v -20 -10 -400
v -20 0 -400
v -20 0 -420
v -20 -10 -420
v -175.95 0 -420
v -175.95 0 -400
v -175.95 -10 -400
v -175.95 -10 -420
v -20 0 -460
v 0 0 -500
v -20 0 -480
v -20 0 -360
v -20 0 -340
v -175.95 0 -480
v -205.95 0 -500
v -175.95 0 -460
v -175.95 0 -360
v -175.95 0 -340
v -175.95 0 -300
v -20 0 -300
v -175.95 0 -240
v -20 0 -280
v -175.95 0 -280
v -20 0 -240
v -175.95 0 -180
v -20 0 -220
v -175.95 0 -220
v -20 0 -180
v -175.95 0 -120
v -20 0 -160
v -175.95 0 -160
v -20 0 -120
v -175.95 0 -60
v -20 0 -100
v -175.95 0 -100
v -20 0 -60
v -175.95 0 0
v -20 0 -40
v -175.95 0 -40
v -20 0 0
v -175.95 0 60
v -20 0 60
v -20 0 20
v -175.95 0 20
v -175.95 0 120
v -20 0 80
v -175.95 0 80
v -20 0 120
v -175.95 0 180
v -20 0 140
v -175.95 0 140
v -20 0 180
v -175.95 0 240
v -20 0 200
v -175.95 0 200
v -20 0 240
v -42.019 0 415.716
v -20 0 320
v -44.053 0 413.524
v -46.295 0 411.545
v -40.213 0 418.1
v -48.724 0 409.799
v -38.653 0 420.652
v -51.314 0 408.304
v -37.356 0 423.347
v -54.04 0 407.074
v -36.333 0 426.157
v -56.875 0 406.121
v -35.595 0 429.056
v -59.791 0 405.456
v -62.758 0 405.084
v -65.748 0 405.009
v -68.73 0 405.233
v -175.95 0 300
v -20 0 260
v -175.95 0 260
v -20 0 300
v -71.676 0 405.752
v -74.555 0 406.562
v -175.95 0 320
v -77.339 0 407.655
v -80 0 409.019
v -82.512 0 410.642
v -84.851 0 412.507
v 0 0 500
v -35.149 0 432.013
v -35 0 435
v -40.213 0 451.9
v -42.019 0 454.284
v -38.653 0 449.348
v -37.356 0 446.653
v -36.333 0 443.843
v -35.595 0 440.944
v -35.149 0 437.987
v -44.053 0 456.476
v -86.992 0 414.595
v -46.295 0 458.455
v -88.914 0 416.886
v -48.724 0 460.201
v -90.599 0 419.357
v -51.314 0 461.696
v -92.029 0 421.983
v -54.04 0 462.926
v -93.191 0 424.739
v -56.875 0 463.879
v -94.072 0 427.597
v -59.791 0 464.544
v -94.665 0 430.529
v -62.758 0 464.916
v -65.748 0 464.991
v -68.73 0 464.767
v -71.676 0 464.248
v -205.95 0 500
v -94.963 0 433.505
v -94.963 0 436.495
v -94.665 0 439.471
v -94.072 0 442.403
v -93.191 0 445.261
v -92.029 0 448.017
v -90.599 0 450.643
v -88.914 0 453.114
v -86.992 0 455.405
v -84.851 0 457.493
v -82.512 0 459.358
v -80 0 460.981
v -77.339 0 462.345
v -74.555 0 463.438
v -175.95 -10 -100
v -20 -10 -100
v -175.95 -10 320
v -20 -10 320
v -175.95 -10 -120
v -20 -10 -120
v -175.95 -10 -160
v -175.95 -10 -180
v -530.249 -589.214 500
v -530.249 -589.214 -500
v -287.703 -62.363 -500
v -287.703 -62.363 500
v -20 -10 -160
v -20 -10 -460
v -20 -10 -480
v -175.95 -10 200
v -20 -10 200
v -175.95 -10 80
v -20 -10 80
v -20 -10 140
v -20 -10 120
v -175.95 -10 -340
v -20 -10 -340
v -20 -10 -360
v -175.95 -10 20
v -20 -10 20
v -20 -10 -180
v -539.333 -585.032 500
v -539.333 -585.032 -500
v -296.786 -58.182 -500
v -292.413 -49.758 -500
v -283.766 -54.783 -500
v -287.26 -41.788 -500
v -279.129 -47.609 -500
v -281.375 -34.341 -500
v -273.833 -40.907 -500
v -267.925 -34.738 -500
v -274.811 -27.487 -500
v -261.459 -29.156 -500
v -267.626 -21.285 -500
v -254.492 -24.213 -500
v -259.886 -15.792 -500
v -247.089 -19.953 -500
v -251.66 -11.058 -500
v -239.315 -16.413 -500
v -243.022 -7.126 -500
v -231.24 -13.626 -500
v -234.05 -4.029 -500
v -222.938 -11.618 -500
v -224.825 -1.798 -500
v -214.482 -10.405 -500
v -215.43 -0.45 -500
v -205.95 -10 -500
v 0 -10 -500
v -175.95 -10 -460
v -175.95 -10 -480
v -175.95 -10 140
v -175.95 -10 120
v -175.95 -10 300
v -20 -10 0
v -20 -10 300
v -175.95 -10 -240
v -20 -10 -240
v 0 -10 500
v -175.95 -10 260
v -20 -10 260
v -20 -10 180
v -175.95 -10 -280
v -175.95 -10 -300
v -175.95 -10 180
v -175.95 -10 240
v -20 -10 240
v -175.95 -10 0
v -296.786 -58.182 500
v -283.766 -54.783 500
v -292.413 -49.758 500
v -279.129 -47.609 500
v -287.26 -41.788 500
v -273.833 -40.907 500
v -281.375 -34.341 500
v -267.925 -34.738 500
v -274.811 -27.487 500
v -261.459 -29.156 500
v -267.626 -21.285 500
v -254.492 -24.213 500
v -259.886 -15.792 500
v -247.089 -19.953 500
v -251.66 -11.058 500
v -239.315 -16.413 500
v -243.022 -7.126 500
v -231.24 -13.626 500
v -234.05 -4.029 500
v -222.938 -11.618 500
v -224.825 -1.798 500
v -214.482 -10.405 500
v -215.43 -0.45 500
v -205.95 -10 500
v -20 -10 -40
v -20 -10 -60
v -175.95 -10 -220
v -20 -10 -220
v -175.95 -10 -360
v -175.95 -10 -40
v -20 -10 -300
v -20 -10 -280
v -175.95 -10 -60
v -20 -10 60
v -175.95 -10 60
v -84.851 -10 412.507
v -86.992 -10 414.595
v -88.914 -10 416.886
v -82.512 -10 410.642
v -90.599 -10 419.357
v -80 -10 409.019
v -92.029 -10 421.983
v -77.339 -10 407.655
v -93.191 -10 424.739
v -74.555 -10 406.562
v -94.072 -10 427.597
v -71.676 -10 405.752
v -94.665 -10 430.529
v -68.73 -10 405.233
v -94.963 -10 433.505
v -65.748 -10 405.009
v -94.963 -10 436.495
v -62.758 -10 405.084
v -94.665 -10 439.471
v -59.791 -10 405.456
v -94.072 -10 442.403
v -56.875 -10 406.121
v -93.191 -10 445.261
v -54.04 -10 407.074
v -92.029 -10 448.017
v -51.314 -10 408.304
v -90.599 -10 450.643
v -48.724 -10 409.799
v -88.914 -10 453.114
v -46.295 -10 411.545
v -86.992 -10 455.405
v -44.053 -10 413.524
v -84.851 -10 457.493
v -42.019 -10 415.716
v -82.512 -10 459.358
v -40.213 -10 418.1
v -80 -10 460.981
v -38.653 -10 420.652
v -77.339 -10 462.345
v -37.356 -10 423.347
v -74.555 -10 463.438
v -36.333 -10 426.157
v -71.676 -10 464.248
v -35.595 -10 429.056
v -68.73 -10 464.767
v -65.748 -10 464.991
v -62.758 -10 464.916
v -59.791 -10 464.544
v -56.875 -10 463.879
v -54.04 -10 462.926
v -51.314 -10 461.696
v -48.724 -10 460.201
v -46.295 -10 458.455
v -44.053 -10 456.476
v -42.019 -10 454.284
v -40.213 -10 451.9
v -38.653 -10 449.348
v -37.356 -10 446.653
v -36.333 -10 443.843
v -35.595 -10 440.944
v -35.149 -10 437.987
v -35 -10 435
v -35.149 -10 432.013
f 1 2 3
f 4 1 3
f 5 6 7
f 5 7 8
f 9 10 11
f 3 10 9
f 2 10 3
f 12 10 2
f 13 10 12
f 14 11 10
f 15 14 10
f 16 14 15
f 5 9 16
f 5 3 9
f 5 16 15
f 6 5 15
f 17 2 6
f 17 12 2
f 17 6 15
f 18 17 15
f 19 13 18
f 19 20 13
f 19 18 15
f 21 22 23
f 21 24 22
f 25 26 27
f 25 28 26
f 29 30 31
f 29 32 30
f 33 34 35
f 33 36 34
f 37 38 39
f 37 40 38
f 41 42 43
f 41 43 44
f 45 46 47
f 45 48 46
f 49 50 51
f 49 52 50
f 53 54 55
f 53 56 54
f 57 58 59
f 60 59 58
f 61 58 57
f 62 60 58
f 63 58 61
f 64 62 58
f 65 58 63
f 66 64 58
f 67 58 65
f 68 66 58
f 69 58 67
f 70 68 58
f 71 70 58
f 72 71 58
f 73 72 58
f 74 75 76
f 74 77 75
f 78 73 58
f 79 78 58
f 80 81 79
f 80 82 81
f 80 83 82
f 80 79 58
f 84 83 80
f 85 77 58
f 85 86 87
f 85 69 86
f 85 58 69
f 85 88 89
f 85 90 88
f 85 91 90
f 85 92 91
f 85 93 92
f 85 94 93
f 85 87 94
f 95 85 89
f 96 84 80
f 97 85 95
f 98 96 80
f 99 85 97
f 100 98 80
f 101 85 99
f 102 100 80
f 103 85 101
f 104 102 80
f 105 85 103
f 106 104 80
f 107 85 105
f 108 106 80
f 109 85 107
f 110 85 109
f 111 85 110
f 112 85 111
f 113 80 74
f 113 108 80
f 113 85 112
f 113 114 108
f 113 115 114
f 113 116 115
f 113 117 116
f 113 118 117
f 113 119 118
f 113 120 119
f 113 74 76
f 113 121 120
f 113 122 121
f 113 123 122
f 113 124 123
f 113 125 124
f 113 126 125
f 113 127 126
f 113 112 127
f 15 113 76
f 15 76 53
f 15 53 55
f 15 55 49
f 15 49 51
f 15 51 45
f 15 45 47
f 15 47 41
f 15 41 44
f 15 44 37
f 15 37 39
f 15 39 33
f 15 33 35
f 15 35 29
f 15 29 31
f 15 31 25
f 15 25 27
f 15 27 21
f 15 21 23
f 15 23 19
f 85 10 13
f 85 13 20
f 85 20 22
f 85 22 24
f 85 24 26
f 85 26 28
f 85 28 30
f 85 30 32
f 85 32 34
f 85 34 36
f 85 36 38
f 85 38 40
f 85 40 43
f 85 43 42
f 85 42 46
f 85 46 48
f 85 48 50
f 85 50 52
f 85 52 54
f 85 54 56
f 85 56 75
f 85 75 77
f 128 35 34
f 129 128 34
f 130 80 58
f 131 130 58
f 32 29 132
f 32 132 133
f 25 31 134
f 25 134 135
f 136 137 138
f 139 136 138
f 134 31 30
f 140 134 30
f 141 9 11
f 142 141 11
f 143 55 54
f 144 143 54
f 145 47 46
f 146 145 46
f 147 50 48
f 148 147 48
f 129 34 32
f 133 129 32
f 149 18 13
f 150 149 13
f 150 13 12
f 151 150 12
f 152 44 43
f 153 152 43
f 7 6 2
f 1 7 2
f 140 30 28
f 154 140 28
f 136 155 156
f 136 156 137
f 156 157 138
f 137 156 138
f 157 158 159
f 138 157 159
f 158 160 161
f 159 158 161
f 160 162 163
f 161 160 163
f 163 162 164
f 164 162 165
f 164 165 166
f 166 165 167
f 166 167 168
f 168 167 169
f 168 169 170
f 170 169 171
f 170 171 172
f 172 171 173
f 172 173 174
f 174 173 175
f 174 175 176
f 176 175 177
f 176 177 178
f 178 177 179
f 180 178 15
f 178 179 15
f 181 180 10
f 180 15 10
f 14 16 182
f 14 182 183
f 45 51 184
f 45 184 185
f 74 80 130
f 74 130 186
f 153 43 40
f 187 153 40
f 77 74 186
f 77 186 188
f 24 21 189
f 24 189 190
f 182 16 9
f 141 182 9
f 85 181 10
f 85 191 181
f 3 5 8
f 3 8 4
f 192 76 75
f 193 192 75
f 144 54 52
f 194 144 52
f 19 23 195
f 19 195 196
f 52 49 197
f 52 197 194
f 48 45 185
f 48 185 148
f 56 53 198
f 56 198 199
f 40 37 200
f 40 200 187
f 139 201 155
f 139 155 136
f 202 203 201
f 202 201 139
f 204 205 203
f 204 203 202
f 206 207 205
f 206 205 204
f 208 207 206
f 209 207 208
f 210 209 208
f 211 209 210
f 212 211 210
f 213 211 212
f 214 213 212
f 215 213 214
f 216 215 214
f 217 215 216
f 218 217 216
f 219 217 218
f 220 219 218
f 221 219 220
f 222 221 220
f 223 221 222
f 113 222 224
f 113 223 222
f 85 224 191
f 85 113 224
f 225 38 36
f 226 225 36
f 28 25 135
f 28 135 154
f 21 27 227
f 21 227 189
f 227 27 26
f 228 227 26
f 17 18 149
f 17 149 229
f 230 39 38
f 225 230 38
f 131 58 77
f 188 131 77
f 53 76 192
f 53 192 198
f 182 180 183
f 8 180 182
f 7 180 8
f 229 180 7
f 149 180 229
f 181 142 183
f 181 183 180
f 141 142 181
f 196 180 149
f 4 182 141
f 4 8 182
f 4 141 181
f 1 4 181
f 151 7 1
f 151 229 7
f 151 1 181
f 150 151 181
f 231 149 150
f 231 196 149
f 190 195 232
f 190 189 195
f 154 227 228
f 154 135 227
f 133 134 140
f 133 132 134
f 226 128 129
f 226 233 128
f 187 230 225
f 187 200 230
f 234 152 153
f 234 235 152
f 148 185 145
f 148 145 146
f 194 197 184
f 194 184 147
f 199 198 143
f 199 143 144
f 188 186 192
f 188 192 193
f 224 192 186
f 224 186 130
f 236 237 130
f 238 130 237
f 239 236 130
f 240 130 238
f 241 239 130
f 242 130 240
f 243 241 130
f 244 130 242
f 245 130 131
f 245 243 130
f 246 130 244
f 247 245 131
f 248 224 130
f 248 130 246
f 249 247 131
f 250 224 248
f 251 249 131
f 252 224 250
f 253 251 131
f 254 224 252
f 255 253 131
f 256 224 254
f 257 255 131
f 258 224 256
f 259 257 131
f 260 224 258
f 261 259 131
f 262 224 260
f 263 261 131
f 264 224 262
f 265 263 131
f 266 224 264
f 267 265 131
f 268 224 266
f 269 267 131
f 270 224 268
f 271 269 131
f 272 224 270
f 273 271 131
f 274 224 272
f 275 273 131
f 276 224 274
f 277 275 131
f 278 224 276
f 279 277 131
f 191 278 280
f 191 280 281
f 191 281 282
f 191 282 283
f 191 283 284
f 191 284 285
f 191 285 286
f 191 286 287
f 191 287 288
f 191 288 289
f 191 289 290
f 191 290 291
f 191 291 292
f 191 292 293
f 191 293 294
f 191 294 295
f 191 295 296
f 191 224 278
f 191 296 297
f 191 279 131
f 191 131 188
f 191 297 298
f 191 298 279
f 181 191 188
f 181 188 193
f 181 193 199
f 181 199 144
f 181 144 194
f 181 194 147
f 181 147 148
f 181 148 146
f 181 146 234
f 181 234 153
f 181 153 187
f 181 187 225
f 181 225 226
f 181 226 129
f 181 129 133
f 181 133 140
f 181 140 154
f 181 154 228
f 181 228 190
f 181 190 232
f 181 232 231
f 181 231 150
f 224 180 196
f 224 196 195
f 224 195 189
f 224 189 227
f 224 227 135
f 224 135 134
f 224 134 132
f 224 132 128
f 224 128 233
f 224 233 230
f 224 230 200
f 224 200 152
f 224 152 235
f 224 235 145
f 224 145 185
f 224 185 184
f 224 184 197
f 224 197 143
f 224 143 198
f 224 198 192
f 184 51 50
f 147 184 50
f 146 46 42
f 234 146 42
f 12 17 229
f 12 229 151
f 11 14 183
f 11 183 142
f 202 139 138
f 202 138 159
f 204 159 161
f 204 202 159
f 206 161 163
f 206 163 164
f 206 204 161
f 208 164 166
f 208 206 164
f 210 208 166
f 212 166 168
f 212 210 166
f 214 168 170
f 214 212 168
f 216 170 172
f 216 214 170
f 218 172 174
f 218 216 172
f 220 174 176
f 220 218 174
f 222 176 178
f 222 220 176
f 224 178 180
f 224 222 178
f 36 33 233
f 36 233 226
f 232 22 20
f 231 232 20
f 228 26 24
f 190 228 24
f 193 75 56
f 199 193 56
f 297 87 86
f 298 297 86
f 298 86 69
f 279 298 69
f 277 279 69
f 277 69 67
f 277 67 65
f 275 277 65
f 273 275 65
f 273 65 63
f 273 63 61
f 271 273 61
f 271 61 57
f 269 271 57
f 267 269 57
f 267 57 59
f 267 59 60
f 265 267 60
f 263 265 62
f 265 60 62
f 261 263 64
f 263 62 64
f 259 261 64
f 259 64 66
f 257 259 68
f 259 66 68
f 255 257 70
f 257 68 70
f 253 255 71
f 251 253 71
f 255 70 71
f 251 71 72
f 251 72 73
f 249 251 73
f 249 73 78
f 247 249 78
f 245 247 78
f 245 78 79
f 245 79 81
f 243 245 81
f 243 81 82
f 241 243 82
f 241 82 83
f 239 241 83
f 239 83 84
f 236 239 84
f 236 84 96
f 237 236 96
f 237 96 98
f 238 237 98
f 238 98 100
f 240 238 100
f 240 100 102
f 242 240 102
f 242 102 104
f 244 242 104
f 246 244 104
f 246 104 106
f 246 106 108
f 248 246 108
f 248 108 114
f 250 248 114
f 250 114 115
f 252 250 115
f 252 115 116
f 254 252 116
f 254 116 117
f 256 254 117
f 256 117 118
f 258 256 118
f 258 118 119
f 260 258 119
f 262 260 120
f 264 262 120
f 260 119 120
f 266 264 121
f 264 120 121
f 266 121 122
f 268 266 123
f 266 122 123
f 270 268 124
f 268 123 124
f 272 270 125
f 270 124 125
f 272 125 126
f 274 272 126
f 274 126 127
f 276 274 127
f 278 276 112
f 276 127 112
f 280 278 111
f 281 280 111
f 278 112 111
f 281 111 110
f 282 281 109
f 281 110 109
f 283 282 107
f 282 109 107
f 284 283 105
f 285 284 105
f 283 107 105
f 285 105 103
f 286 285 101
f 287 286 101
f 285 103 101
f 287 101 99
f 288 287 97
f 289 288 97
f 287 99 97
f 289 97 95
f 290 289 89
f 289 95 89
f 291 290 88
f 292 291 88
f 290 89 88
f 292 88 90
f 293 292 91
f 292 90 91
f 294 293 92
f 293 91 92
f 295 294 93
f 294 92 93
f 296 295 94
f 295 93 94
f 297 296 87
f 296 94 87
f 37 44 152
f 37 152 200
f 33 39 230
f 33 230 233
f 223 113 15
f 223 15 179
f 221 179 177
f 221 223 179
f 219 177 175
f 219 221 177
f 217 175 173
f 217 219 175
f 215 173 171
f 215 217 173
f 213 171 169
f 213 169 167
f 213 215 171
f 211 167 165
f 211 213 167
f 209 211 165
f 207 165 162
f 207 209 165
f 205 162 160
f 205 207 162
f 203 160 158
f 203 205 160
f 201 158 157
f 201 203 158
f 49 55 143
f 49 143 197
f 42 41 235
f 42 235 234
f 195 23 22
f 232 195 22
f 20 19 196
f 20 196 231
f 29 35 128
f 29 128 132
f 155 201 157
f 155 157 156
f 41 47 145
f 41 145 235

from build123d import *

# Parameters (mm, degrees)
EXTRUDE_THIN1_DEPTH = 500
SKETCH2_W           = 155.95
SKETCH2_H           = 20
CUT_EXTRUDE1_DEPTH  = 590.213534275
LPATTERN1_COUNT     = 14
LPATTERN1_PITCH     = 60
SKETCH3_R           = 30
CUT_EXTRUDE2_DEPTH  = 590.213534275


with BuildPart() as part:
    # Sketch1 → Extrude-Thin1 (new body, symmetric)
    with BuildSketch(Plane.XY):
        with BuildLine():
            Line((0, 0), (-205.95, 0))
            ThreePointArc((-205.95, 0), (-259.885879639, -15.792394123), (-296.786225905, -58.181582248))
            Line((-296.786225905, -58.181582248), (-539.333048865, -585.0316925))
            Line((-539.333048865, -585.0316925), (-530.249426274, -589.213534275))
            Line((-530.249426274, -589.213534275), (-287.702603315, -62.363424024))
            ThreePointArc((-287.702603315, -62.363424024), (-254.492291675, -24.21315471), (-205.95, -10))
            Line((-205.95, -10), (0, -10))
            Line((0, -10), (0, 0))
        make_face()
    extrude(amount=EXTRUDE_THIN1_DEPTH, both=True)

    # Sketch2 → Cut-Extrude1 (cut, through all)
    with BuildSketch(Plane(origin=(0, 0, 0), x_dir=(1, 0, 0), z_dir=(0, 1, 0))):
        with Locations((-97.975, 470)):
            Rectangle(SKETCH2_W, SKETCH2_H)
    cut_extrude1 = extrude(amount=-CUT_EXTRUDE1_DEPTH, mode=Mode.SUBTRACT)

    # LPattern1: Cut-Extrude1 ×14
    with Locations(*[(0, 0, i * LPATTERN1_PITCH) for i in range(1, LPATTERN1_COUNT)]):
        add(cut_extrude1, mode=Mode.SUBTRACT)

    # Sketch3 → Cut-Extrude2 (cut, through all)
    with BuildSketch(Plane(origin=(0, 0, 0), x_dir=(1, 0, 0), z_dir=(0, 1, 0))):
        with Locations((-65, -435)):
            Circle(SKETCH3_R)
    extrude(amount=-CUT_EXTRUDE2_DEPTH, mode=Mode.SUBTRACT)


solid = part.part
